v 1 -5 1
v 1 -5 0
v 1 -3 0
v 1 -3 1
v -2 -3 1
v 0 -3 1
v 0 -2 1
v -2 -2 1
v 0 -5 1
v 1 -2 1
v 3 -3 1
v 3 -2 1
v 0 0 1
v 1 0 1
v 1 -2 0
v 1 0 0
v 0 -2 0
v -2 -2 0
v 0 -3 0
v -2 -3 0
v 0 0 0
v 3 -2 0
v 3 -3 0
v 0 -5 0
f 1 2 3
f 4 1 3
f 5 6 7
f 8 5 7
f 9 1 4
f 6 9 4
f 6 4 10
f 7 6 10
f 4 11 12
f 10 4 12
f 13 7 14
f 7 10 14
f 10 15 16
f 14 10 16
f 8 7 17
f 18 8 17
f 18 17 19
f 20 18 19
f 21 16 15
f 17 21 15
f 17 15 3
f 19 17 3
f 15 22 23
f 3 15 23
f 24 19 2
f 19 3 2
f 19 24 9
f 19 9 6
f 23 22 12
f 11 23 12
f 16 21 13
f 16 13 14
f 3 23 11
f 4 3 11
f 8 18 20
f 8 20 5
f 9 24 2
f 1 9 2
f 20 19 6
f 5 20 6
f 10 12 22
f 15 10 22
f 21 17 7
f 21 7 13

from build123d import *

# Parameters (mm, degrees)
SKETCH1_W                = 1
SKETCH1_H                = 5
BOSS_EXTRUDE1_DEPTH      = 1
SKETCH2_R                = 0.228902054
BOSS_EXTRUDE2_DEPTH      = 0.01
BOSS_EXTRUDE3_DEPTH      = 2
BOSS_EXTRUDE3_DEPTH_BACK = 3


with BuildPart() as part:
    # Sketch1 → Boss-Extrude1 (new body)
    with BuildSketch(Plane.XY):
        with Locations((0.5, -2.5)):
            Rectangle(SKETCH1_W, SKETCH1_H)
    extrude(amount=BOSS_EXTRUDE1_DEPTH)

    # Sketch2 → Boss-Extrude2 (add)
    with BuildSketch(Plane(origin=(1, 0, 0), x_dir=(0, 0, -1), z_dir=(1, 0, 0))):
        with Locations(Location((-0.5, -2.5, 0), (0, 0, 270))):
            Circle(SKETCH2_R)
    extrude(amount=BOSS_EXTRUDE2_DEPTH)

    # Sketch3 → Boss-Extrude3 (add, two sides: drawn at the far end of the back side and taken through both)
    with BuildSketch(Plane.ZY.offset(-BOSS_EXTRUDE3_DEPTH_BACK)):
        Polygon((0.6, -2), (0.4, -3), (1, -3), (1, -2), align=None)
        Polygon((0, -3), (0.4, -3), (0.6, -2), (0, -2), align=None)
    extrude(amount=BOSS_EXTRUDE3_DEPTH + BOSS_EXTRUDE3_DEPTH_BACK)


solid = part.part
